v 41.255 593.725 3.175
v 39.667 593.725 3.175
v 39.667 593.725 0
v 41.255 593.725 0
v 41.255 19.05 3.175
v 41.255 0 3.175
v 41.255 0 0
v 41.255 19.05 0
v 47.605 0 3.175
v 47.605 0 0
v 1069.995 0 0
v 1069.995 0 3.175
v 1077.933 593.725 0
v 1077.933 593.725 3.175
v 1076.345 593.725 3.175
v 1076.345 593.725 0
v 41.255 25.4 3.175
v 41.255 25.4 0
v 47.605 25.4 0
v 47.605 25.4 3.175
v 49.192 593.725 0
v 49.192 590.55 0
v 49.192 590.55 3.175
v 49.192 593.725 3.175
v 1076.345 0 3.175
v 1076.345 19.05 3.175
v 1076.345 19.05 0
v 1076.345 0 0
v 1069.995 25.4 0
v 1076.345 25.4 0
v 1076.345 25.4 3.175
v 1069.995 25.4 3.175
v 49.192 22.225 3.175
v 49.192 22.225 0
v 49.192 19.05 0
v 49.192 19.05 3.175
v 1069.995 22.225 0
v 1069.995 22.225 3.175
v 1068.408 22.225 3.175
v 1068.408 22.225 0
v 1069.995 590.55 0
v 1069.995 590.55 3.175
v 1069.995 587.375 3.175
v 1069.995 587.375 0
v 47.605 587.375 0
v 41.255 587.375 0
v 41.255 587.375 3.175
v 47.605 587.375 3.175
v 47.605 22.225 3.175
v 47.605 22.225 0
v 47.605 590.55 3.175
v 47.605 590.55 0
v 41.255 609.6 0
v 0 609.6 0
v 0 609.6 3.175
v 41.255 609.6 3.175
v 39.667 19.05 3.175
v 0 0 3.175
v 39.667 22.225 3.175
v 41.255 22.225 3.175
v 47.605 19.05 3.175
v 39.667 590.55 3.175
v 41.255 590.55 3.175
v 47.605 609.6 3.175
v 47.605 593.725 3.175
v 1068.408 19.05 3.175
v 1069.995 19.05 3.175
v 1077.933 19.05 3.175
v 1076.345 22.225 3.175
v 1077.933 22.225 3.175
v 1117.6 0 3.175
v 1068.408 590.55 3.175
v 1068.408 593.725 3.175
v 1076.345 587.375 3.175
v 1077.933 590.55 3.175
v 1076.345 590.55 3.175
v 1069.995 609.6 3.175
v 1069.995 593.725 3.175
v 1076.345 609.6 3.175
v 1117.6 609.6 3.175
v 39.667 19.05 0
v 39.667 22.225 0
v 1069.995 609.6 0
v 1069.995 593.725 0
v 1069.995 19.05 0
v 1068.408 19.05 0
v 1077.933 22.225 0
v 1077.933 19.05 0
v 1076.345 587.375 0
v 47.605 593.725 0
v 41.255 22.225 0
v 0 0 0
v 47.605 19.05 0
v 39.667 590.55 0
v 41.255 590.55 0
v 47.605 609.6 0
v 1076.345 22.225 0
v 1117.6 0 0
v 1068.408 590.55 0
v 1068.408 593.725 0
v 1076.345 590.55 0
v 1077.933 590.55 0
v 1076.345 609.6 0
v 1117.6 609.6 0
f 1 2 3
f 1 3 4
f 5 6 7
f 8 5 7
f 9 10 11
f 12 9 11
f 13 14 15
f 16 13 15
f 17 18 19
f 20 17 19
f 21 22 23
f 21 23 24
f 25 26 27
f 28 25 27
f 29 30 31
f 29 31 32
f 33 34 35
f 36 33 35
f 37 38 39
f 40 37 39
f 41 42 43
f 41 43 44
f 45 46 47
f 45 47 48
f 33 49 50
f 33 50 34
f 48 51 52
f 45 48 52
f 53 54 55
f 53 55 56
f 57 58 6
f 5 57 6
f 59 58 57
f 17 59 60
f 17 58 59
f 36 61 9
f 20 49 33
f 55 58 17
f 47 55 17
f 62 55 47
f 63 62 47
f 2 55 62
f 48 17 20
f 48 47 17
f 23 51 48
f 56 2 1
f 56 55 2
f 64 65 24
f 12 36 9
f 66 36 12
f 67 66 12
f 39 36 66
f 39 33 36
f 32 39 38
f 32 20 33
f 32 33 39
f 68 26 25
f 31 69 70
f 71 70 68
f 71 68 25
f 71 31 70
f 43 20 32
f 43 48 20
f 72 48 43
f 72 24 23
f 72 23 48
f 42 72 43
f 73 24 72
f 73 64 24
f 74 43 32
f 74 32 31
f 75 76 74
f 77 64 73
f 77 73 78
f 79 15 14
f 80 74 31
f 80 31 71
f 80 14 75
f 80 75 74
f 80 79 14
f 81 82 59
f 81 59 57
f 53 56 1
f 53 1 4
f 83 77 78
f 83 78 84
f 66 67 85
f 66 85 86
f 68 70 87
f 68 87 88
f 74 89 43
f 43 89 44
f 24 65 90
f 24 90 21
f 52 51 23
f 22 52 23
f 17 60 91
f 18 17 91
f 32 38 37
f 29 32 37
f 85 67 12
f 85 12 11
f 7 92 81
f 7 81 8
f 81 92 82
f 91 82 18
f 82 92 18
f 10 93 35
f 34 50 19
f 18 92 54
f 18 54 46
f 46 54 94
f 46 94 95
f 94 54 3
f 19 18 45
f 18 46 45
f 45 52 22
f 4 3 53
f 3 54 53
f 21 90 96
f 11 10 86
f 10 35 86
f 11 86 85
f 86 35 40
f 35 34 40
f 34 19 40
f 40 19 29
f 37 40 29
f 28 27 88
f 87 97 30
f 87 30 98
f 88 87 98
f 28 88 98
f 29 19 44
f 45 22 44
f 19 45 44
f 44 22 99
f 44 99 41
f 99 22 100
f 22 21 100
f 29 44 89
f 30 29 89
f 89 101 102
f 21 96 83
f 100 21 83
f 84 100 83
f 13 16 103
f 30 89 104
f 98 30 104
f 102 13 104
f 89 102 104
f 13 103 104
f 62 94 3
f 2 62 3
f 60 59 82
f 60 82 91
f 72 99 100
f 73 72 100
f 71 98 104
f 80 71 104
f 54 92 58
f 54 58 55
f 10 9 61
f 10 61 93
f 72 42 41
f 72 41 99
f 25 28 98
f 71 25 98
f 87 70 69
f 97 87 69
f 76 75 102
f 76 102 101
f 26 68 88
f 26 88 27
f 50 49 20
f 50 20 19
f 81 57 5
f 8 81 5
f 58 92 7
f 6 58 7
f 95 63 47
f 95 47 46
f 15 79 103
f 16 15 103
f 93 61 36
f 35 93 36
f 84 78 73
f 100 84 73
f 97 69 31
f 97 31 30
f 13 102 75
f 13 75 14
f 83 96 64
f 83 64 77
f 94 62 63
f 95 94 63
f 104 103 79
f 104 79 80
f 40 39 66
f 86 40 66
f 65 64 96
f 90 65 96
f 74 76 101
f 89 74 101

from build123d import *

# Parameters (mm, degrees)
SKETCH1_W               = 1117.6
SKETCH1_H               = 609.6
BOSS_EXTRUDE1_DEPTH     = 3.175
SKETCH4_W               = 6.35
SKETCH4_H               = 3.175
CUT_EXTRUDE2_DEPTH      = 25.4
SKETCH5_W               = 9.525
SKETCH5_H               = 3.175
CUT_EXTRUDE3_DEPTH      = 25.4
MIRROR2_COPY_1_SKETCH_W = 6.35
MIRROR2_COPY_1_SKETCH_H = 3.175
MIRROR2_COPY_1_DEPTH    = 25.4
MIRROR2_COPY_2_SKETCH_W = 9.525
MIRROR2_COPY_2_SKETCH_H = 3.175
MIRROR2_COPY_2_DEPTH    = 25.4


with BuildPart() as part:
    # Sketch1 → Boss-Extrude1 (new body)
    with BuildSketch(Plane.XY):
        with Locations((558.8, 304.8)):
            Rectangle(SKETCH1_W, SKETCH1_H)
    extrude(amount=BOSS_EXTRUDE1_DEPTH)

    # Sketch4 → Cut-Extrude2 (cut)
    with BuildSketch(Plane(origin=(0, 612.775, 0), x_dir=(1, 0, 0), z_dir=(0, 1, 0))):
        with Locations((44.429546792, -1.5875)):
            Rectangle(SKETCH4_W, SKETCH4_H)
    cut_extrude2 = extrude(amount=-CUT_EXTRUDE2_DEPTH, mode=Mode.SUBTRACT)

    # Sketch5 → Cut-Extrude3 (cut)
    with BuildSketch(Plane.XY.offset(3.175)):
        with Locations((44.429546792, 592.1375)):
            Rectangle(SKETCH5_W, SKETCH5_H)
    cut_extrude3 = extrude(amount=-CUT_EXTRUDE3_DEPTH, mode=Mode.SUBTRACT)

    # Mirror1: Cut-Extrude2, Cut-Extrude3 across plane
    add(cut_extrude2.mirror(Plane.ZY.offset(-558.8)), mode=Mode.SUBTRACT)
    add(cut_extrude3.mirror(Plane.ZY.offset(-558.8)), mode=Mode.SUBTRACT)

    # Mirror2: Cut-Extrude2, Cut-Extrude3 across plane
    add(cut_extrude2.mirror(Plane.ZX.offset(306.3875)), mode=Mode.SUBTRACT)
    add(cut_extrude3.mirror(Plane.ZX.offset(306.3875)), mode=Mode.SUBTRACT)

    # Mirror2 copy 1 sketch → Mirror2 copy 1 (cut)
    with BuildSketch(Plane(origin=(1117.6, 0, 0), x_dir=(-1, 0, 0), z_dir=(0, -1, 0))):
        with Locations((44.429546792, -1.5875)):
            Rectangle(MIRROR2_COPY_1_SKETCH_W, MIRROR2_COPY_1_SKETCH_H)
    extrude(amount=-MIRROR2_COPY_1_DEPTH, mode=Mode.SUBTRACT)

    # Mirror2 copy 2 sketch → Mirror2 copy 2 (cut)
    with BuildSketch(Plane(origin=(1117.6, 612.775, 3.175), x_dir=(-1, 0, 0), z_dir=(0, 0, 1))):
        with Locations((44.429546792, 592.1375)):
            Rectangle(MIRROR2_COPY_2_SKETCH_W, MIRROR2_COPY_2_SKETCH_H)
    extrude(amount=-MIRROR2_COPY_2_DEPTH, mode=Mode.SUBTRACT)


solid = part.part
